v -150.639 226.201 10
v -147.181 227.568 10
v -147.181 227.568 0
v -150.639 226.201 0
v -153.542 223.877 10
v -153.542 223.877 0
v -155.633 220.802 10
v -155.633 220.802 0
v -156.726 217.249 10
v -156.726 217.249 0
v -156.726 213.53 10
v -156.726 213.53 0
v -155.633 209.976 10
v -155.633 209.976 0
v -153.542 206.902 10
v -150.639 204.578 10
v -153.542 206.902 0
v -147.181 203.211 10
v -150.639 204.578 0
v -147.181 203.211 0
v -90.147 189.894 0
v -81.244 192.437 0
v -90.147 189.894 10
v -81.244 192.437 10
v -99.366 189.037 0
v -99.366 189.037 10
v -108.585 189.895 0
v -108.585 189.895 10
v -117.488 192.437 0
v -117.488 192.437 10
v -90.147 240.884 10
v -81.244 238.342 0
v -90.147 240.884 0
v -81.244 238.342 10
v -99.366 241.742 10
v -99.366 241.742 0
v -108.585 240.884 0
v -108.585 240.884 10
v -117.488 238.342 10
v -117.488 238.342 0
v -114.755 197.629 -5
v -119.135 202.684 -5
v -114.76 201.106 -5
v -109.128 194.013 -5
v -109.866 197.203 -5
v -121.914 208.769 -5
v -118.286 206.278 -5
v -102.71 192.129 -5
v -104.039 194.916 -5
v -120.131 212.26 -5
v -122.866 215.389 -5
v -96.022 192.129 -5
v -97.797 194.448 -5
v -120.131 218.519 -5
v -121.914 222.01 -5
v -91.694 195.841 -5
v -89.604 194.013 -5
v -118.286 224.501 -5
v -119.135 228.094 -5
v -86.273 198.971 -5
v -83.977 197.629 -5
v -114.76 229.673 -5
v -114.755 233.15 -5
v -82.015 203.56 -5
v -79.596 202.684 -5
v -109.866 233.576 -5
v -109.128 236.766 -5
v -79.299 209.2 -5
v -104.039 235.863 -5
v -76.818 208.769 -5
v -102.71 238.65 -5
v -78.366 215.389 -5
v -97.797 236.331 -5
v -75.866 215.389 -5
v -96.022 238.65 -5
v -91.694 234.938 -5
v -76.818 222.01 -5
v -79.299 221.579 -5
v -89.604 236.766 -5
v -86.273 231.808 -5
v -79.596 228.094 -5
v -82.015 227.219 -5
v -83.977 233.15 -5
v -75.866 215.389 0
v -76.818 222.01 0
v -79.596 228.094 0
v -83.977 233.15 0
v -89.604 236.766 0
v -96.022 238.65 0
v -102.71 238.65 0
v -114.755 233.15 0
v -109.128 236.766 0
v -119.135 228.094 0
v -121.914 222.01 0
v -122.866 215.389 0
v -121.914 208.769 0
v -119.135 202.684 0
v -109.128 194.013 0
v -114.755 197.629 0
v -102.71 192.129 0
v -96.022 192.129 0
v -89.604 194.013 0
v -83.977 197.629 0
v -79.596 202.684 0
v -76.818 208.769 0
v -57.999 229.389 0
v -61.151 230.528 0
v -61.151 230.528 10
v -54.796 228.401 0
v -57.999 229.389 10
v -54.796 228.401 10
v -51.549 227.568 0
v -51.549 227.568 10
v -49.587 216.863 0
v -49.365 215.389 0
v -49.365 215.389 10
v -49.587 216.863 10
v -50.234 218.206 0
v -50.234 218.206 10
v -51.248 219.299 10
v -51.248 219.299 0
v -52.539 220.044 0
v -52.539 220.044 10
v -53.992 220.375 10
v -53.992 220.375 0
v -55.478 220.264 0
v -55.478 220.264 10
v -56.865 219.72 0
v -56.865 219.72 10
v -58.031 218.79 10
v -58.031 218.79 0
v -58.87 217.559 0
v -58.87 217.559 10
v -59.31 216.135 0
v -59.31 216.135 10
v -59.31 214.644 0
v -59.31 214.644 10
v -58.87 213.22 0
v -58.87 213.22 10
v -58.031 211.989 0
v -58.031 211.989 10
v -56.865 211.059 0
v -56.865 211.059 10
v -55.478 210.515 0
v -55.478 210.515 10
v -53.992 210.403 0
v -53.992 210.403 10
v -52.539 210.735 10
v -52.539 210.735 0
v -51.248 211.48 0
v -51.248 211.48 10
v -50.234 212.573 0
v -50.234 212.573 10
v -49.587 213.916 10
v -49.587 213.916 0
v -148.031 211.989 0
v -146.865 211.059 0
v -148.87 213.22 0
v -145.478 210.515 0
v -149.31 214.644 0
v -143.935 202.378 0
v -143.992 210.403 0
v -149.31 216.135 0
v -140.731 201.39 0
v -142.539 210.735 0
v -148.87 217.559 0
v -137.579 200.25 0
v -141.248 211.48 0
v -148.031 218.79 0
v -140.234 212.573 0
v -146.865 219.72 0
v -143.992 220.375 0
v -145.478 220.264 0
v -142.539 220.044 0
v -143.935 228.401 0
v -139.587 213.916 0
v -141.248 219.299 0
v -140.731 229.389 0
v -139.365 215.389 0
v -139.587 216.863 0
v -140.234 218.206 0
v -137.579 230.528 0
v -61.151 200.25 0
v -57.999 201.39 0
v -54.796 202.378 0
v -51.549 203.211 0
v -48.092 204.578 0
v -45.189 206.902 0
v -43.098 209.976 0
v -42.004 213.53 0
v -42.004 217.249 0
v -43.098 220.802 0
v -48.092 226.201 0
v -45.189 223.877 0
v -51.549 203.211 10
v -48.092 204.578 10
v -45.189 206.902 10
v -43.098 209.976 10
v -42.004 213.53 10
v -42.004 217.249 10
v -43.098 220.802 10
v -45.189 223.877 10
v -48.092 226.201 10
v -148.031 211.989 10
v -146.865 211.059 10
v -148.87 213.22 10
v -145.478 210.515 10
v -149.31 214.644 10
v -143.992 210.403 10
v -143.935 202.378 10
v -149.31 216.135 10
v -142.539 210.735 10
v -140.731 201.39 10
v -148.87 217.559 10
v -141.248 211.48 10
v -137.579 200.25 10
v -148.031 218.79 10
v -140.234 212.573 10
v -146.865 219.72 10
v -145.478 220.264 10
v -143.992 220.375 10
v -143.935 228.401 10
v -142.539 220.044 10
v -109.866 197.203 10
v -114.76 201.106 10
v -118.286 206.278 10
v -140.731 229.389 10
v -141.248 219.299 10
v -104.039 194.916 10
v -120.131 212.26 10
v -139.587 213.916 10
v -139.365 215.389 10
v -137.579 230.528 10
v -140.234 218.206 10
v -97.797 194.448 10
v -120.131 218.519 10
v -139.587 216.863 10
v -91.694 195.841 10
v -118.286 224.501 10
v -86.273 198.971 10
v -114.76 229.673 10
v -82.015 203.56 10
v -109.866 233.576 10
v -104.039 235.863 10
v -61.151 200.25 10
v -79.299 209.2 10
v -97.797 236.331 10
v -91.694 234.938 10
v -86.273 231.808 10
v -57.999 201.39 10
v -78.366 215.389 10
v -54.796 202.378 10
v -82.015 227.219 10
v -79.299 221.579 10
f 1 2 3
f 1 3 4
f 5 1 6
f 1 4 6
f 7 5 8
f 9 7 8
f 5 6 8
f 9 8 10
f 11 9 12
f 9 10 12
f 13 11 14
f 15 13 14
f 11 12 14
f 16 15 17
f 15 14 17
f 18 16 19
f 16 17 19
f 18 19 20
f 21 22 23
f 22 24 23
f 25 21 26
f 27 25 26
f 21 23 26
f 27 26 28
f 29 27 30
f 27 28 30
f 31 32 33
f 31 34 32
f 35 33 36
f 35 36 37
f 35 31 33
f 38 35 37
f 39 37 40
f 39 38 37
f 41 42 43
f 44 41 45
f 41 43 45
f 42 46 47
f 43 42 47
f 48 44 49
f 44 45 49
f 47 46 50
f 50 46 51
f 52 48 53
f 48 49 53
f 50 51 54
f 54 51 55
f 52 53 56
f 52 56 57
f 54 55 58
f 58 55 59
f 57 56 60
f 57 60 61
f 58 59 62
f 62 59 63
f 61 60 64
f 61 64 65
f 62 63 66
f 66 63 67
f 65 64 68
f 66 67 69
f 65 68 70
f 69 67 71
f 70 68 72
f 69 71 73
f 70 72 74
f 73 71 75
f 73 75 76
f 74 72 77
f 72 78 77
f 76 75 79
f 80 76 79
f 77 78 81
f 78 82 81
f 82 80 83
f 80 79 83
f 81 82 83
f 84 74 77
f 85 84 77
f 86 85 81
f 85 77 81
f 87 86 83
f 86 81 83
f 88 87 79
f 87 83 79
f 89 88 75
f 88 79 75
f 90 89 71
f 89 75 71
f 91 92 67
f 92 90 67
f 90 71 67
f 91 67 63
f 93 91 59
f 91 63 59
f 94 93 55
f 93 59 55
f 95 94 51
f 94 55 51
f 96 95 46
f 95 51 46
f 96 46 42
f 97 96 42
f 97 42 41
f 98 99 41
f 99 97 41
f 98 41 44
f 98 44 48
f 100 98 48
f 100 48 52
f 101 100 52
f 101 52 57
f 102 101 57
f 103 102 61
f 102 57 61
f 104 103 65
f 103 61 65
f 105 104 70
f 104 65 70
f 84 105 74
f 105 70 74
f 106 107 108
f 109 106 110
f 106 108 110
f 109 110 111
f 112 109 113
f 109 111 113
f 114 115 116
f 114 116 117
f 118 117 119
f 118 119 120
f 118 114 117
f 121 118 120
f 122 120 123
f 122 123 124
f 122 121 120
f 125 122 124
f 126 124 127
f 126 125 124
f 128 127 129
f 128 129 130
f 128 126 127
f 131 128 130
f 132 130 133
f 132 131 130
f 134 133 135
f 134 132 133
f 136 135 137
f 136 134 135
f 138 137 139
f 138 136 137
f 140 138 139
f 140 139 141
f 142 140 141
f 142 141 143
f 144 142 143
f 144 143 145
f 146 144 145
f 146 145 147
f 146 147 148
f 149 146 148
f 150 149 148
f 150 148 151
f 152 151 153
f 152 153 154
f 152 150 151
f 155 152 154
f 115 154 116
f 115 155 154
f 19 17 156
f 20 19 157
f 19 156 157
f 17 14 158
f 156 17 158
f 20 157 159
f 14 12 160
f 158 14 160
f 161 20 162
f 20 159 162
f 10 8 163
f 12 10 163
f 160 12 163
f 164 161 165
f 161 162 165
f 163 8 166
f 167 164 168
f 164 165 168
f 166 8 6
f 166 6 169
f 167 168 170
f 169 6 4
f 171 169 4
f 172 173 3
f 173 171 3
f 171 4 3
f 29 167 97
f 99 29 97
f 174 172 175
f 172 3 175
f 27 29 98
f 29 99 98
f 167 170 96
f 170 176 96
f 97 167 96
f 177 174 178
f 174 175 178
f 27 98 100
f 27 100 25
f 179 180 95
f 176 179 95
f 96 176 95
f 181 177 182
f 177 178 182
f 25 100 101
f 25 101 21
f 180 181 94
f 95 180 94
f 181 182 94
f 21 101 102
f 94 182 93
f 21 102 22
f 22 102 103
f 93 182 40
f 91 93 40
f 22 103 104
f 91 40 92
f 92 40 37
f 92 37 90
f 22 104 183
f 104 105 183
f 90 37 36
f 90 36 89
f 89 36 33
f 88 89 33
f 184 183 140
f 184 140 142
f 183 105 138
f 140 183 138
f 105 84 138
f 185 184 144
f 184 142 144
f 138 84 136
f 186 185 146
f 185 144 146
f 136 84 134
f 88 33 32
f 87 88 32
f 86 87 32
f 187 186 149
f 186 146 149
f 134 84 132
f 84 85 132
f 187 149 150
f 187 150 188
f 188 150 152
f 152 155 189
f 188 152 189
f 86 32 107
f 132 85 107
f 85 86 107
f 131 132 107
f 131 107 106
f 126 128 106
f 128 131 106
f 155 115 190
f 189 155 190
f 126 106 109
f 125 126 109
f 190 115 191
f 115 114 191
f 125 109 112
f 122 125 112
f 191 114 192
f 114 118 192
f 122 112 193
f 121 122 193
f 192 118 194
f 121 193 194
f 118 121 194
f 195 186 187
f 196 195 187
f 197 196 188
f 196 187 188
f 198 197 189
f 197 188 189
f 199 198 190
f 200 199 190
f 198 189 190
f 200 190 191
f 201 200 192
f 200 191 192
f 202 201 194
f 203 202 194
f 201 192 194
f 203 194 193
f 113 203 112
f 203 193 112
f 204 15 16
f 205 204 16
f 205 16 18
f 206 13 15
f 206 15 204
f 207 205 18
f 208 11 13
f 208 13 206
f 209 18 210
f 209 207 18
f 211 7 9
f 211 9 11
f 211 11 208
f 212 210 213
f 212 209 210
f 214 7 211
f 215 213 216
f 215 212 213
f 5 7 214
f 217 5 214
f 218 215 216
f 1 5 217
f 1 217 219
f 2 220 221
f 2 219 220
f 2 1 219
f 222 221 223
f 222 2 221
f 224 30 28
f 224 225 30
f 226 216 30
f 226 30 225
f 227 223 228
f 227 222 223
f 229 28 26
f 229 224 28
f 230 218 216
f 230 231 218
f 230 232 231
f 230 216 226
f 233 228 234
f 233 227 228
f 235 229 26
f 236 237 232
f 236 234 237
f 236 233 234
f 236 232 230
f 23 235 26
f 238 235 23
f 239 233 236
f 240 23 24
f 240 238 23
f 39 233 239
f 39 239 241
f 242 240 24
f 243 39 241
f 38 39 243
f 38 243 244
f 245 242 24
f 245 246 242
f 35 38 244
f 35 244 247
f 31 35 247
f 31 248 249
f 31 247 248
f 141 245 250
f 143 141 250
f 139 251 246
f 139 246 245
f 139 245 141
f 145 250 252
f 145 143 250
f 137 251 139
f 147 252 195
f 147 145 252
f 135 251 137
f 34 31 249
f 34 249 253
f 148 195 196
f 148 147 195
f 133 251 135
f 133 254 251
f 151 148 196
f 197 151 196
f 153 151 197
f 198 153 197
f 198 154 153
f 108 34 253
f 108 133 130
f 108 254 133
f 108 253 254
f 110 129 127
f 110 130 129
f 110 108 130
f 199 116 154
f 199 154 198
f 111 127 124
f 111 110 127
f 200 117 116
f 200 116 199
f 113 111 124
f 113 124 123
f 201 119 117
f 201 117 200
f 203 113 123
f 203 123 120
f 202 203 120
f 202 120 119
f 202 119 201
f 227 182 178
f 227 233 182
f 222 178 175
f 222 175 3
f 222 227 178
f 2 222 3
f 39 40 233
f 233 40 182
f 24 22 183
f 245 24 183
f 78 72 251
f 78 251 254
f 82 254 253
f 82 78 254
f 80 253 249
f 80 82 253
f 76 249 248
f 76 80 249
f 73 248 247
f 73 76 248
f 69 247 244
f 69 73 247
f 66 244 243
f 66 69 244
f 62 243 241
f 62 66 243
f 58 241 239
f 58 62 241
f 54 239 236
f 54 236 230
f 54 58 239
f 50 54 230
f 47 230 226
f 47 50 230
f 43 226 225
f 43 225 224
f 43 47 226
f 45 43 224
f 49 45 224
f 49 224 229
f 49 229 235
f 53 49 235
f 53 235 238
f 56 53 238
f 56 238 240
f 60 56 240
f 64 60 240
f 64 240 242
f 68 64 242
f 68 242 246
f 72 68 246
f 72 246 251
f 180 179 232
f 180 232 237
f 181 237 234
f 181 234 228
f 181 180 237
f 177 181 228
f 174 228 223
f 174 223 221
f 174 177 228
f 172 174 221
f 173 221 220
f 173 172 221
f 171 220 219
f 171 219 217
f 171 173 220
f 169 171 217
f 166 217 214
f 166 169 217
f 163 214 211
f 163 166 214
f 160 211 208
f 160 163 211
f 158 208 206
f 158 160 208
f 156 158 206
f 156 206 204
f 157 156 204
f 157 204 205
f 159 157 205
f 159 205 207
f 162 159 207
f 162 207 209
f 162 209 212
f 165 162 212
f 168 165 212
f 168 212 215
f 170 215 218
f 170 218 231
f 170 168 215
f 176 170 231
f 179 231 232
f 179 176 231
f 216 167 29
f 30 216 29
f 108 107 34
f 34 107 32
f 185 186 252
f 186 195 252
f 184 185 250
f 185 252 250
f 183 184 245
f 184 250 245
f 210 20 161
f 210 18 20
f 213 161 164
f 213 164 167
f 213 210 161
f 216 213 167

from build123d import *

# Parameters (mm, degrees)
SKETCH1_R           = 21
SKETCH1_R_2         = 5
BOSS_EXTRUDE1_DEPTH = 10
FILLET1_R           = 50
FILLET2_R           = 70
BOSS_EXTRUDE2_START = -15
SKETCH2_R           = 23.5
SKETCH2_R_2         = 21
BOSS_EXTRUDE2_DEPTH = 15


with BuildPart() as part:
    # Sketch1 → Boss-Extrude1 (new body)
    with BuildSketch(Plane.XY):
        with BuildLine():
            Line((-54.365348895, 227.889389357), (-99.36593713, 245.389389357))
            Line((-99.36593713, 245.389389357), (-144.365348895, 227.889389357))
            ThreePointArc((-144.365348895, 227.889389357), (-156.865348895, 215.389389357), (-144.365348895, 202.889389357))
            Line((-144.365348895, 202.889389357), (-99.36593713, 185.389389357))
            Line((-99.36593713, 185.389389357), (-54.365348895, 202.889389357))
            ThreePointArc((-54.365348895, 202.889389357), (-41.865348895, 215.389389357), (-54.365348895, 227.889389357))
        make_face()
        with Locations((-99.36593713, 215.389389357)):
            Circle(SKETCH1_R, mode=Mode.SUBTRACT)
        with Locations((-54.365348895, 215.389389357)):
            Circle(SKETCH1_R_2, mode=Mode.SUBTRACT)
        with Locations((-144.365348895, 215.389389357)):
            Circle(SKETCH1_R_2, mode=Mode.SUBTRACT)
    extrude(amount=BOSS_EXTRUDE1_DEPTH)

    # Fillet1
    fillet1_edges = [part.edges().sort_by_distance(p)[0] for p in [
        (-99.36593713, 185.389389357, 5),
        (-99.36593713, 245.389389357, 5),
    ]]
    fillet(fillet1_edges, radius=FILLET1_R)

    # Fillet2
    fillet2_edges = [part.edges().sort_by_distance(p)[0] for p in [
        (-54.365348895, 202.889389357, 5),
        (-144.365348895, 202.889389357, 5),
        (-144.365348895, 227.889389357, 5),
        (-54.365348895, 227.889389357, 5),
    ]]
    fillet(fillet2_edges, radius=FILLET2_R)

    # Sketch2 → Boss-Extrude2 (add)
    with BuildSketch(Plane.XY.offset(10).offset(BOSS_EXTRUDE2_START)):
        with Locations((-99.36593713, 215.389389357)):
            Circle(SKETCH2_R)
        with Locations((-99.36593713, 215.389389357)):
            Circle(SKETCH2_R_2, mode=Mode.SUBTRACT)
    extrude(amount=BOSS_EXTRUDE2_DEPTH)


solid = part.part
